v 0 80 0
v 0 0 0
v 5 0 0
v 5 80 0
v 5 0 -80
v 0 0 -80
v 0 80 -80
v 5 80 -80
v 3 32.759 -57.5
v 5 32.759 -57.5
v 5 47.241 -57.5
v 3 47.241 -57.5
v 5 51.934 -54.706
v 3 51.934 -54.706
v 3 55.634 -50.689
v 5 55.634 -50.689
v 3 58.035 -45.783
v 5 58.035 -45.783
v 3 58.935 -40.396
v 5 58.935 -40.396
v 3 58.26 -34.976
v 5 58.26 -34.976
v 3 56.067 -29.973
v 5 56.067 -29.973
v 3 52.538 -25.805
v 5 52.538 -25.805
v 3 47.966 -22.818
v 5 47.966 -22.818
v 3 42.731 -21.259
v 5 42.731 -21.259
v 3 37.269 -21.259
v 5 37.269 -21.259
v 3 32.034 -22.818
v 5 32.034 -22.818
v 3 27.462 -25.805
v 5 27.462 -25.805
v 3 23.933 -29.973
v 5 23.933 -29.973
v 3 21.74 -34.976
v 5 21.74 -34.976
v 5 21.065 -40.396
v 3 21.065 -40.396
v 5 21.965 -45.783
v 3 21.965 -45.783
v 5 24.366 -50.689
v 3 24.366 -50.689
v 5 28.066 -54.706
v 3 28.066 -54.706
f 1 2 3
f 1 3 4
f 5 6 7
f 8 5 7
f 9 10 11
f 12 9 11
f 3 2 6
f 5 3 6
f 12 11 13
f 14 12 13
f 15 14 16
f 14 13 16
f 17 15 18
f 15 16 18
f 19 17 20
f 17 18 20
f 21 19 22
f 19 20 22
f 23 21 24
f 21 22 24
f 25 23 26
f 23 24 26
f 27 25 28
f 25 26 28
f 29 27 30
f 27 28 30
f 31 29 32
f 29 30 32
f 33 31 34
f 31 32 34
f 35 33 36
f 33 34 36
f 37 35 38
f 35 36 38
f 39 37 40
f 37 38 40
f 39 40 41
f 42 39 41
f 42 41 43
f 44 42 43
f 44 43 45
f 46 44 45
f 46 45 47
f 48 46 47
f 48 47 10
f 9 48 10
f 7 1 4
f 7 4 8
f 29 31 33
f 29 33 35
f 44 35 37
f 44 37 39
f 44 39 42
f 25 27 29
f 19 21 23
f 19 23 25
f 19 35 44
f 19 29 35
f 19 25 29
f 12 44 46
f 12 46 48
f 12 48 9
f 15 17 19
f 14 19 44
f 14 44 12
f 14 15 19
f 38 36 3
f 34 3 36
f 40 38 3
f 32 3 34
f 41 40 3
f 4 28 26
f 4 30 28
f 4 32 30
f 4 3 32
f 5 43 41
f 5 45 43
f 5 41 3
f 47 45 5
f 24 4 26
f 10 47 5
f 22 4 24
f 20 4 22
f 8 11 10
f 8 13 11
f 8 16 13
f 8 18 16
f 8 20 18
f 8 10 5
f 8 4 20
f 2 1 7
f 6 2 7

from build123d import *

# Parameters (mm, degrees)
SKETCH2_W           = 80
SKETCH2_H           = 80
BOSS_EXTRUDE1_DEPTH = 5
BOSS_EXTRUDE2_DEPTH = 1
CUT_EXTRUDE1_DEPTH  = 3


with BuildPart() as part:
    # Sketch2 → Boss-Extrude1 (new body)
    with BuildSketch(Plane(origin=(0, 0, 0), x_dir=(0, 0, -1), z_dir=(1, 0, 0))):
        with Locations((40, 40)):
            Rectangle(SKETCH2_W, SKETCH2_H)
    extrude(amount=BOSS_EXTRUDE1_DEPTH)

    # Sketch3 → Boss-Extrude2 (add)
    with BuildSketch(Plane(origin=(5, 0, 0), x_dir=(0, 0, -1), z_dir=(1, 0, 0))):
        with BuildLine():
            Line((57, 32.75895), (57, 47.24105))
            ThreePointArc((57, 47.24105), (21.522099548, 40), (57, 32.75895))
        make_face()
    extrude(amount=BOSS_EXTRUDE2_DEPTH)

    # Sketch4 → Cut-Extrude1 (cut)
    with BuildSketch(Plane(origin=(6, 0, 0), x_dir=(0, 0, -1), z_dir=(1, 0, 0))):
        with BuildLine():
            Line((57.5, 32.75895), (57.5, 47.24105))
            ThreePointArc((57.5, 47.24105), (21.061076981, 40), (57.5, 32.75895))
        make_face()
    extrude(amount=-CUT_EXTRUDE1_DEPTH, mode=Mode.SUBTRACT)


solid = part.part
